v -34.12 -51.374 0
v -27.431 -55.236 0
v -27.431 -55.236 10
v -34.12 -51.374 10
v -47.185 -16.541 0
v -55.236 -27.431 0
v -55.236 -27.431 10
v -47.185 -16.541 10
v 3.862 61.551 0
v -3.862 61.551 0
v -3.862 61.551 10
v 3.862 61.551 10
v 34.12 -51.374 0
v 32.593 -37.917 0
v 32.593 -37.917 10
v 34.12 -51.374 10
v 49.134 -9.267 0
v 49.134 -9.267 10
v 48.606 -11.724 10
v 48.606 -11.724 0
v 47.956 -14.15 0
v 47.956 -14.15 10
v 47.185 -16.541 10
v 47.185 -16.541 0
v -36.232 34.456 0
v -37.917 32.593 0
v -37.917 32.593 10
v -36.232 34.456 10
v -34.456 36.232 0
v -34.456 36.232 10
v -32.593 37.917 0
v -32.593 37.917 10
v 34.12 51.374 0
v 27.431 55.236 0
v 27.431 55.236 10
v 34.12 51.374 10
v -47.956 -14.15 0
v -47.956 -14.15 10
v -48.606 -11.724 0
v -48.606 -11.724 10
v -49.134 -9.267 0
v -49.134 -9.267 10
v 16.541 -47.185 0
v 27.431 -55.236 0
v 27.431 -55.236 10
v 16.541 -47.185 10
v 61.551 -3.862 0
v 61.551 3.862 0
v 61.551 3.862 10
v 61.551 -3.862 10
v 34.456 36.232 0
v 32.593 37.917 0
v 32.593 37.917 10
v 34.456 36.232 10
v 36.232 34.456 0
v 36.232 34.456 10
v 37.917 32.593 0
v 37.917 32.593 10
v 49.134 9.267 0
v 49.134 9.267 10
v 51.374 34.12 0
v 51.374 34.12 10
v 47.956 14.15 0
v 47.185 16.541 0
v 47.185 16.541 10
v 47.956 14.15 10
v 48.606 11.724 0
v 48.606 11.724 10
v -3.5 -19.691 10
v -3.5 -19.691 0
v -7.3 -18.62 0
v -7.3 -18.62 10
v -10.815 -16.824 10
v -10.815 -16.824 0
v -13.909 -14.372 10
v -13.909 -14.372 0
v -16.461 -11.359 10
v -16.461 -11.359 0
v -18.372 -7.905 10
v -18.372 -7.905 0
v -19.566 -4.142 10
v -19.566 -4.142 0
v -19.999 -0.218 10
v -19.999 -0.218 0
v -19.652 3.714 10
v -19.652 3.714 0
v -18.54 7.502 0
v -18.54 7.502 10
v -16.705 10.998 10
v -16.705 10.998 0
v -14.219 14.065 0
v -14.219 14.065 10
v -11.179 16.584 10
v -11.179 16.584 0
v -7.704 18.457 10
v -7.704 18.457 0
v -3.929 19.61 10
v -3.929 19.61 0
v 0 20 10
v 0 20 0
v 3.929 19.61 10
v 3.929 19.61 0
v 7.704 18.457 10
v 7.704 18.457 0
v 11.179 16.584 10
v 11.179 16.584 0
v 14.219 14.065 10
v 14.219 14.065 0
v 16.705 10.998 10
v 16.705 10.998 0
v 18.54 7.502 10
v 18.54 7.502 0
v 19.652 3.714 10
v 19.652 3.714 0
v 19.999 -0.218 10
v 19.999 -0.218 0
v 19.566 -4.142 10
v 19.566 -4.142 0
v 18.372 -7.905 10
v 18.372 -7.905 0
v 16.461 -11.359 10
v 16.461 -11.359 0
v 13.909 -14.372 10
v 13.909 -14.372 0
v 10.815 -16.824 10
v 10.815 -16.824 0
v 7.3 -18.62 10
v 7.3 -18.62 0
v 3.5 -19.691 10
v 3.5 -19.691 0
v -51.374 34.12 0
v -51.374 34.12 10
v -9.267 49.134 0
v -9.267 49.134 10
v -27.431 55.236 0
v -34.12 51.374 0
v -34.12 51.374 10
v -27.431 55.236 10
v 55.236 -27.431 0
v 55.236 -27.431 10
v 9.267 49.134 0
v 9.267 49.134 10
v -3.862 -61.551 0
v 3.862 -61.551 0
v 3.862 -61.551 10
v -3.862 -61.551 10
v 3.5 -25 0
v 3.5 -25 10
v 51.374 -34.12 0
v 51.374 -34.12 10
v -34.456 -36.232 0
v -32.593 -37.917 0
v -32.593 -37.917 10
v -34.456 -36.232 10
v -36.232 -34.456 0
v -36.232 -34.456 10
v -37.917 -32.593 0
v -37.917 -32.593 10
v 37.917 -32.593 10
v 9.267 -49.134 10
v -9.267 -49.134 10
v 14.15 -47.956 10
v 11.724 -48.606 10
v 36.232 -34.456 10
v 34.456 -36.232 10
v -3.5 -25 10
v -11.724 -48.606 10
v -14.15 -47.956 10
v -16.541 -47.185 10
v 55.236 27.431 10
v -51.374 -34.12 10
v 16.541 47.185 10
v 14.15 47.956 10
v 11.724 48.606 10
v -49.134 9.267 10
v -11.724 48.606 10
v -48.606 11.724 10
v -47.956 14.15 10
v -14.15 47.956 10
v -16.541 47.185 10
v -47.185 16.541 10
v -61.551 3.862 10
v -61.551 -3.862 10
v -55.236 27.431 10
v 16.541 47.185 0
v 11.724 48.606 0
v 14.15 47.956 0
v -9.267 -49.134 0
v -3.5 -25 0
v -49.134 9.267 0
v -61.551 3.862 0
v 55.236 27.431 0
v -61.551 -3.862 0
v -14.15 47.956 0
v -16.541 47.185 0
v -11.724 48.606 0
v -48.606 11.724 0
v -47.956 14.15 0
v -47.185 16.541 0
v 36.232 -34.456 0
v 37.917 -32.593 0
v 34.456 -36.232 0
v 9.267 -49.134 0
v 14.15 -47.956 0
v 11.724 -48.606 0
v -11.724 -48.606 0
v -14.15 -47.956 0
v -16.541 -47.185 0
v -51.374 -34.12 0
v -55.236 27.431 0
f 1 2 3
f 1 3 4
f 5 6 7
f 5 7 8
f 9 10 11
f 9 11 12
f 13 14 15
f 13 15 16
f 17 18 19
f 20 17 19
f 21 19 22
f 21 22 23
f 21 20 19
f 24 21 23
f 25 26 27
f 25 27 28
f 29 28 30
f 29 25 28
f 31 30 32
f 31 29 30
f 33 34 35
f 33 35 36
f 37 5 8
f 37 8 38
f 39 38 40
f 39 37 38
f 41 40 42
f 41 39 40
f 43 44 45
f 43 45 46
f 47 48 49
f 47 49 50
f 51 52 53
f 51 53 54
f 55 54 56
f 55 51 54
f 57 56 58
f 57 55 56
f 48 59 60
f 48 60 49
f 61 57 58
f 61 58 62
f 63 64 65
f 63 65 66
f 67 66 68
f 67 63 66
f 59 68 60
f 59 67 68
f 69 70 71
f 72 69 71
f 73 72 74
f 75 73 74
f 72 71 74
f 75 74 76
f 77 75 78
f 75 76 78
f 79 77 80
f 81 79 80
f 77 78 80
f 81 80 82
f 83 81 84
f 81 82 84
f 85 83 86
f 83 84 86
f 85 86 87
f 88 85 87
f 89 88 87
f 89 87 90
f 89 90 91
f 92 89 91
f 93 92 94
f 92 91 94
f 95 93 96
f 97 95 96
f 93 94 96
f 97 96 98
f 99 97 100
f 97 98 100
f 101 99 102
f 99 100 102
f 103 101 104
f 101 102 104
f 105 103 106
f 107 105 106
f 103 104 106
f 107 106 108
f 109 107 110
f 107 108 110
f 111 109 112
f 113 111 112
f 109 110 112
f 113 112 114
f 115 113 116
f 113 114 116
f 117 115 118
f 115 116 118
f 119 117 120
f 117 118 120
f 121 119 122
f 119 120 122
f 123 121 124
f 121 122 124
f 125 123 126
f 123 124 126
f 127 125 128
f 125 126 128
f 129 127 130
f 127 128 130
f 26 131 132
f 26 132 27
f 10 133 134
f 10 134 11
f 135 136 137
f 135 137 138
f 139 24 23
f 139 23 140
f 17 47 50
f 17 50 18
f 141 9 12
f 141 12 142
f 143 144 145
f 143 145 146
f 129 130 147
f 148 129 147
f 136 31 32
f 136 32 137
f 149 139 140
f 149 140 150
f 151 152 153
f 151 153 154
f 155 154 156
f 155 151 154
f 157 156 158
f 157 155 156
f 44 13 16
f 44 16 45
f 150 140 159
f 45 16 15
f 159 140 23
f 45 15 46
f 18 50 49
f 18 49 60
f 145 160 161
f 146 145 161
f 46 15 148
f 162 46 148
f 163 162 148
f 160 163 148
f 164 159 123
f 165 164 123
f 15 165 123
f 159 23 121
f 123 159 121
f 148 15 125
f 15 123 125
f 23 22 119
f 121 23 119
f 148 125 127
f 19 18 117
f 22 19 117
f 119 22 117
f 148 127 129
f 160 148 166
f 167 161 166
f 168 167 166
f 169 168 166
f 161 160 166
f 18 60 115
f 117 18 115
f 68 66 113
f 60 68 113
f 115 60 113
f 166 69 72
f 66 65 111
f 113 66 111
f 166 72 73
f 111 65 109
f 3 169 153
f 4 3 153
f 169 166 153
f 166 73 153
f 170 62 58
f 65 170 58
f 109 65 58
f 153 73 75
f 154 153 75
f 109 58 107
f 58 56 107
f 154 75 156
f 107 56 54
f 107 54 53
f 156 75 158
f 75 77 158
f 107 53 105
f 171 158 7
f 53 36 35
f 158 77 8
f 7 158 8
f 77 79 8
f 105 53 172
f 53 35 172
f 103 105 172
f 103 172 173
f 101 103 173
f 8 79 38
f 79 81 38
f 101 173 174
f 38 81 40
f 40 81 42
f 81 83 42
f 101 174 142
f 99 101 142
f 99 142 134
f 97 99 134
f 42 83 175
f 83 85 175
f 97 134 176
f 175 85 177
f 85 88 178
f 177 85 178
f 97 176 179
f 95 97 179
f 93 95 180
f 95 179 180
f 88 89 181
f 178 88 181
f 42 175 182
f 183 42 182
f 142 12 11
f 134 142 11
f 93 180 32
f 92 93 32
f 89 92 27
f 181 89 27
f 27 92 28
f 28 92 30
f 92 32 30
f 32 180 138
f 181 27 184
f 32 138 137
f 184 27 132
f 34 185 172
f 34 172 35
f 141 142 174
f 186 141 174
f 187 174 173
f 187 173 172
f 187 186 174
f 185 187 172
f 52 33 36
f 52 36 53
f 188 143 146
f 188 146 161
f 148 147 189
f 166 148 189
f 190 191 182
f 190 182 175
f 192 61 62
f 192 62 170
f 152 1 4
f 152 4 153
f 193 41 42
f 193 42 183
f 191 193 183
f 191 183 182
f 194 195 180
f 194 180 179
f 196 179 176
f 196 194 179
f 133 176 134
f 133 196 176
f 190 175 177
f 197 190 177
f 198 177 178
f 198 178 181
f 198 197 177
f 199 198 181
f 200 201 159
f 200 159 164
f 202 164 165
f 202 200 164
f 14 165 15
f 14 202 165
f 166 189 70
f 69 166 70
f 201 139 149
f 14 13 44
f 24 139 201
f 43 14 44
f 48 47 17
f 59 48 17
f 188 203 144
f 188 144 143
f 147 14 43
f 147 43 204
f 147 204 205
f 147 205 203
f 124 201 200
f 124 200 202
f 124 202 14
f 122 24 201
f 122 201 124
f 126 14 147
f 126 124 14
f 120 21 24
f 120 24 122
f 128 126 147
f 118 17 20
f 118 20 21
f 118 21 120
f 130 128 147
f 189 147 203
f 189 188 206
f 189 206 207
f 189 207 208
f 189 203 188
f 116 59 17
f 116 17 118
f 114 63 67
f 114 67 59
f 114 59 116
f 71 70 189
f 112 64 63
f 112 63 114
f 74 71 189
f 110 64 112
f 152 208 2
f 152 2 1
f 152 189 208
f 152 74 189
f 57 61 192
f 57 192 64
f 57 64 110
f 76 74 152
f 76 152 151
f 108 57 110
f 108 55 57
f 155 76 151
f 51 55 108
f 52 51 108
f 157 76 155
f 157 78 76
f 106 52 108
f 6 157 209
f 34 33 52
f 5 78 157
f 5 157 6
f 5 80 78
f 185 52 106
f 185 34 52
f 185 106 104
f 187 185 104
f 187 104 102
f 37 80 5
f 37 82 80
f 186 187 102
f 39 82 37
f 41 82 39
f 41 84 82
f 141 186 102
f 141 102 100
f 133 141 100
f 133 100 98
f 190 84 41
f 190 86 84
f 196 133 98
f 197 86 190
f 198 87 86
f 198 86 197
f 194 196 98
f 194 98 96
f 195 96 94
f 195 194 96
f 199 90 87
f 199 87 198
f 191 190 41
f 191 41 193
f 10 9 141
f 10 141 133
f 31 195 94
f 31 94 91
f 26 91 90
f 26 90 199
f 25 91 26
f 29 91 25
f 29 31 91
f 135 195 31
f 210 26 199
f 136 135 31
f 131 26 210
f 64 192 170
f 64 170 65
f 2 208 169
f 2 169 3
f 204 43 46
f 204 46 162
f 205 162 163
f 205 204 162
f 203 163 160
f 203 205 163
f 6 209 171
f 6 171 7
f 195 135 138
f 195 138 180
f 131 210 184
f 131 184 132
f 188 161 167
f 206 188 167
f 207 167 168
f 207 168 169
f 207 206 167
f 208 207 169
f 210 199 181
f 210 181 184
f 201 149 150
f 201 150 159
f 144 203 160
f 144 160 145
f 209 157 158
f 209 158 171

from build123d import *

# Parameters (mm, degrees)
BOSS_EXTRUDE1_DEPTH = 10
CUT_EXTRUDE1_DEPTH  = 10


with BuildPart() as part:
    # Sketch1 → Boss-Extrude1 (new body)
    with BuildSketch(Plane.XY):
        with BuildLine():
            Line((-3.862051717, 61.551449242), (3.862051717, 61.551449242))
            Line((3.862051717, 61.551449242), (9.267481785, 49.133631876))
            ThreePointArc((9.267481785, 49.133631876), (12.940952255, 48.296291314), (16.540941283, 47.184714278))
            Line((16.540941283, 47.184714278), (27.431089723, 55.236144542))
            Line((27.431089723, 55.236144542), (34.120359519, 51.374092825))
            Line((34.120359519, 51.374092825), (32.592690593, 37.917232493))
            ThreePointArc((32.592690593, 37.917232493), (35.355339059, 35.355339059), (37.917232493, 32.592690593))
            Line((37.917232493, 32.592690593), (51.374092825, 34.120359519))
            Line((51.374092825, 34.120359519), (55.236144542, 27.431089723))
            Line((55.236144542, 27.431089723), (47.184714278, 16.540941283))
            ThreePointArc((47.184714278, 16.540941283), (48.296291314, 12.940952255), (49.133631876, 9.267481785))
            Line((49.133631876, 9.267481785), (61.551449242, 3.862051717))
            Line((61.551449242, 3.862051717), (61.551449242, -3.862051717))
            Line((61.551449242, -3.862051717), (49.133631876, -9.267481785))
            ThreePointArc((49.133631876, -9.267481785), (48.296291314, -12.940952255), (47.184714278, -16.540941283))
            Line((47.184714278, -16.540941283), (55.236144542, -27.431089723))
            Line((55.236144542, -27.431089723), (51.374092825, -34.120359519))
            Line((51.374092825, -34.120359519), (37.917232493, -32.592690593))
            ThreePointArc((37.917232493, -32.592690593), (35.355339059, -35.355339059), (32.592690593, -37.917232493))
            Line((32.592690593, -37.917232493), (34.120359519, -51.374092825))
            Line((34.120359519, -51.374092825), (27.431089723, -55.236144542))
            Line((27.431089723, -55.236144542), (16.540941283, -47.184714278))
            ThreePointArc((16.540941283, -47.184714278), (12.940952255, -48.296291314), (9.267481785, -49.133631876))
            Line((9.267481785, -49.133631876), (3.862051717, -61.551449242))
            Line((3.862051717, -61.551449242), (-3.862051717, -61.551449242))
            Line((-3.862051717, -61.551449242), (-9.267481785, -49.133631876))
            ThreePointArc((-9.267481785, -49.133631876), (-12.940952255, -48.296291314), (-16.540941283, -47.184714278))
            Line((-16.540941283, -47.184714278), (-27.431089723, -55.236144542))
            Line((-27.431089723, -55.236144542), (-34.120359519, -51.374092825))
            Line((-34.120359519, -51.374092825), (-32.592690593, -37.917232493))
            ThreePointArc((-32.592690593, -37.917232493), (-35.355339059, -35.355339059), (-37.917232493, -32.592690593))
            Line((-37.917232493, -32.592690593), (-51.374092825, -34.120359519))
            Line((-51.374092825, -34.120359519), (-55.236144542, -27.431089723))
            Line((-55.236144542, -27.431089723), (-47.184714278, -16.540941283))
            ThreePointArc((-47.184714278, -16.540941283), (-48.296291314, -12.940952255), (-49.133631876, -9.267481785))
            Line((-49.133631876, -9.267481785), (-61.551449242, -3.862051717))
            Line((-61.551449242, -3.862051717), (-61.551449242, 3.862051717))
            Line((-61.551449242, 3.862051717), (-49.133631876, 9.267481785))
            ThreePointArc((-49.133631876, 9.267481785), (-48.296291314, 12.940952255), (-47.184714278, 16.540941283))
            Line((-47.184714278, 16.540941283), (-55.236144542, 27.431089723))
            Line((-55.236144542, 27.431089723), (-51.374092825, 34.120359519))
            Line((-51.374092825, 34.120359519), (-37.917232493, 32.592690593))
            ThreePointArc((-37.917232493, 32.592690593), (-35.355339059, 35.355339059), (-32.592690593, 37.917232493))
            Line((-32.592690593, 37.917232493), (-34.120359519, 51.374092825))
            Line((-34.120359519, 51.374092825), (-27.431089723, 55.236144542))
            Line((-27.431089723, 55.236144542), (-16.540941283, 47.184714278))
            ThreePointArc((-16.540941283, 47.184714278), (-12.940952255, 48.296291314), (-9.267481785, 49.133631876))
            Line((-9.267481785, 49.133631876), (-3.862051717, 61.551449242))
        make_face()
    extrude(amount=BOSS_EXTRUDE1_DEPTH)

    # Sketch2 → Cut-Extrude1 (cut)
    with BuildSketch(Plane(origin=(0, 0, 0), x_dir=(-1, 0, 0), z_dir=(0, 0, -1))):
        with BuildLine():
            Line((3.5, -25), (3.5, -19.691368668))
            ThreePointArc((3.5, -19.691368668), (0, 20), (-3.5, -19.691368668))
            Line((-3.5, -19.691368668), (-3.5, -25))
            Line((-3.5, -25), (0, -25))
            Line((0, -25), (3.5, -25))
        make_face()
    extrude(amount=-CUT_EXTRUDE1_DEPTH, mode=Mode.SUBTRACT)


solid = part.part
